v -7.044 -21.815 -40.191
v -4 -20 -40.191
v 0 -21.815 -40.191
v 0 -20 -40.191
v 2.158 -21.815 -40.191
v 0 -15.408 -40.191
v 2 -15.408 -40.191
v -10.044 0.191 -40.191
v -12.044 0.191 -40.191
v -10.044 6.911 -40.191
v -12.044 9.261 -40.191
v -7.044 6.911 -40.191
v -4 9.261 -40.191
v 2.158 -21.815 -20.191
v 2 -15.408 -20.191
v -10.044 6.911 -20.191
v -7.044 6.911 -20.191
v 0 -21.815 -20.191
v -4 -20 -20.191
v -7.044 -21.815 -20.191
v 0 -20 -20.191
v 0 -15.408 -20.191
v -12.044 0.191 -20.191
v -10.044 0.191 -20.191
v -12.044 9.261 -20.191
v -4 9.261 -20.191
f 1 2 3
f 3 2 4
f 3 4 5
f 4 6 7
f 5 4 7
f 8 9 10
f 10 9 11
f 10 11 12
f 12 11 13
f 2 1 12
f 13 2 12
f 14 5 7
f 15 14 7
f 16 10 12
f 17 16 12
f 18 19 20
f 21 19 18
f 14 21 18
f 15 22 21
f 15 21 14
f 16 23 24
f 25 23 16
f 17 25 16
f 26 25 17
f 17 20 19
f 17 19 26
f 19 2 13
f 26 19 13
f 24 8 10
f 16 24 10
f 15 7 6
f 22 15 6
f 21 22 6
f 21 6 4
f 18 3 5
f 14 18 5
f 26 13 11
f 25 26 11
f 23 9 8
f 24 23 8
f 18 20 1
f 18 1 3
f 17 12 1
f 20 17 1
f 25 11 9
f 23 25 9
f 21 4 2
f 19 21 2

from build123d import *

# Parameters (mm, degrees)
F1_DEPTH = 20
F2_ANGLE = -90


with BuildPart() as f1:
    # F0 (on Front) → F1 (new body)
    with BuildSketch(Plane.XZ):
        Polygon((-10.0444195345, 6.7202923819), (-7.0444195345, 6.7202923819), (-7.0444195345, -22.0063235611), (0, -22.0063235611), (2.1582664922, -22.0060478896), (2, -15.5988996848), (0, -15.5988996848), (0, -20.1908871531), (-4, -20.1908871531), (-4, 9.0697817504), (-12.0444195345, 9.0697817504), (-12.0444195345, 0), (-10.0444195345, 0), align=None)
    extrude(amount=F1_DEPTH)


with BuildPart() as f1_1:
    # F2: moved
    add(f1.part.rotate(Axis((-2, -20, -20.1908871531), (1, 0, 0)), F2_ANGLE))


solid = f1_1.part
